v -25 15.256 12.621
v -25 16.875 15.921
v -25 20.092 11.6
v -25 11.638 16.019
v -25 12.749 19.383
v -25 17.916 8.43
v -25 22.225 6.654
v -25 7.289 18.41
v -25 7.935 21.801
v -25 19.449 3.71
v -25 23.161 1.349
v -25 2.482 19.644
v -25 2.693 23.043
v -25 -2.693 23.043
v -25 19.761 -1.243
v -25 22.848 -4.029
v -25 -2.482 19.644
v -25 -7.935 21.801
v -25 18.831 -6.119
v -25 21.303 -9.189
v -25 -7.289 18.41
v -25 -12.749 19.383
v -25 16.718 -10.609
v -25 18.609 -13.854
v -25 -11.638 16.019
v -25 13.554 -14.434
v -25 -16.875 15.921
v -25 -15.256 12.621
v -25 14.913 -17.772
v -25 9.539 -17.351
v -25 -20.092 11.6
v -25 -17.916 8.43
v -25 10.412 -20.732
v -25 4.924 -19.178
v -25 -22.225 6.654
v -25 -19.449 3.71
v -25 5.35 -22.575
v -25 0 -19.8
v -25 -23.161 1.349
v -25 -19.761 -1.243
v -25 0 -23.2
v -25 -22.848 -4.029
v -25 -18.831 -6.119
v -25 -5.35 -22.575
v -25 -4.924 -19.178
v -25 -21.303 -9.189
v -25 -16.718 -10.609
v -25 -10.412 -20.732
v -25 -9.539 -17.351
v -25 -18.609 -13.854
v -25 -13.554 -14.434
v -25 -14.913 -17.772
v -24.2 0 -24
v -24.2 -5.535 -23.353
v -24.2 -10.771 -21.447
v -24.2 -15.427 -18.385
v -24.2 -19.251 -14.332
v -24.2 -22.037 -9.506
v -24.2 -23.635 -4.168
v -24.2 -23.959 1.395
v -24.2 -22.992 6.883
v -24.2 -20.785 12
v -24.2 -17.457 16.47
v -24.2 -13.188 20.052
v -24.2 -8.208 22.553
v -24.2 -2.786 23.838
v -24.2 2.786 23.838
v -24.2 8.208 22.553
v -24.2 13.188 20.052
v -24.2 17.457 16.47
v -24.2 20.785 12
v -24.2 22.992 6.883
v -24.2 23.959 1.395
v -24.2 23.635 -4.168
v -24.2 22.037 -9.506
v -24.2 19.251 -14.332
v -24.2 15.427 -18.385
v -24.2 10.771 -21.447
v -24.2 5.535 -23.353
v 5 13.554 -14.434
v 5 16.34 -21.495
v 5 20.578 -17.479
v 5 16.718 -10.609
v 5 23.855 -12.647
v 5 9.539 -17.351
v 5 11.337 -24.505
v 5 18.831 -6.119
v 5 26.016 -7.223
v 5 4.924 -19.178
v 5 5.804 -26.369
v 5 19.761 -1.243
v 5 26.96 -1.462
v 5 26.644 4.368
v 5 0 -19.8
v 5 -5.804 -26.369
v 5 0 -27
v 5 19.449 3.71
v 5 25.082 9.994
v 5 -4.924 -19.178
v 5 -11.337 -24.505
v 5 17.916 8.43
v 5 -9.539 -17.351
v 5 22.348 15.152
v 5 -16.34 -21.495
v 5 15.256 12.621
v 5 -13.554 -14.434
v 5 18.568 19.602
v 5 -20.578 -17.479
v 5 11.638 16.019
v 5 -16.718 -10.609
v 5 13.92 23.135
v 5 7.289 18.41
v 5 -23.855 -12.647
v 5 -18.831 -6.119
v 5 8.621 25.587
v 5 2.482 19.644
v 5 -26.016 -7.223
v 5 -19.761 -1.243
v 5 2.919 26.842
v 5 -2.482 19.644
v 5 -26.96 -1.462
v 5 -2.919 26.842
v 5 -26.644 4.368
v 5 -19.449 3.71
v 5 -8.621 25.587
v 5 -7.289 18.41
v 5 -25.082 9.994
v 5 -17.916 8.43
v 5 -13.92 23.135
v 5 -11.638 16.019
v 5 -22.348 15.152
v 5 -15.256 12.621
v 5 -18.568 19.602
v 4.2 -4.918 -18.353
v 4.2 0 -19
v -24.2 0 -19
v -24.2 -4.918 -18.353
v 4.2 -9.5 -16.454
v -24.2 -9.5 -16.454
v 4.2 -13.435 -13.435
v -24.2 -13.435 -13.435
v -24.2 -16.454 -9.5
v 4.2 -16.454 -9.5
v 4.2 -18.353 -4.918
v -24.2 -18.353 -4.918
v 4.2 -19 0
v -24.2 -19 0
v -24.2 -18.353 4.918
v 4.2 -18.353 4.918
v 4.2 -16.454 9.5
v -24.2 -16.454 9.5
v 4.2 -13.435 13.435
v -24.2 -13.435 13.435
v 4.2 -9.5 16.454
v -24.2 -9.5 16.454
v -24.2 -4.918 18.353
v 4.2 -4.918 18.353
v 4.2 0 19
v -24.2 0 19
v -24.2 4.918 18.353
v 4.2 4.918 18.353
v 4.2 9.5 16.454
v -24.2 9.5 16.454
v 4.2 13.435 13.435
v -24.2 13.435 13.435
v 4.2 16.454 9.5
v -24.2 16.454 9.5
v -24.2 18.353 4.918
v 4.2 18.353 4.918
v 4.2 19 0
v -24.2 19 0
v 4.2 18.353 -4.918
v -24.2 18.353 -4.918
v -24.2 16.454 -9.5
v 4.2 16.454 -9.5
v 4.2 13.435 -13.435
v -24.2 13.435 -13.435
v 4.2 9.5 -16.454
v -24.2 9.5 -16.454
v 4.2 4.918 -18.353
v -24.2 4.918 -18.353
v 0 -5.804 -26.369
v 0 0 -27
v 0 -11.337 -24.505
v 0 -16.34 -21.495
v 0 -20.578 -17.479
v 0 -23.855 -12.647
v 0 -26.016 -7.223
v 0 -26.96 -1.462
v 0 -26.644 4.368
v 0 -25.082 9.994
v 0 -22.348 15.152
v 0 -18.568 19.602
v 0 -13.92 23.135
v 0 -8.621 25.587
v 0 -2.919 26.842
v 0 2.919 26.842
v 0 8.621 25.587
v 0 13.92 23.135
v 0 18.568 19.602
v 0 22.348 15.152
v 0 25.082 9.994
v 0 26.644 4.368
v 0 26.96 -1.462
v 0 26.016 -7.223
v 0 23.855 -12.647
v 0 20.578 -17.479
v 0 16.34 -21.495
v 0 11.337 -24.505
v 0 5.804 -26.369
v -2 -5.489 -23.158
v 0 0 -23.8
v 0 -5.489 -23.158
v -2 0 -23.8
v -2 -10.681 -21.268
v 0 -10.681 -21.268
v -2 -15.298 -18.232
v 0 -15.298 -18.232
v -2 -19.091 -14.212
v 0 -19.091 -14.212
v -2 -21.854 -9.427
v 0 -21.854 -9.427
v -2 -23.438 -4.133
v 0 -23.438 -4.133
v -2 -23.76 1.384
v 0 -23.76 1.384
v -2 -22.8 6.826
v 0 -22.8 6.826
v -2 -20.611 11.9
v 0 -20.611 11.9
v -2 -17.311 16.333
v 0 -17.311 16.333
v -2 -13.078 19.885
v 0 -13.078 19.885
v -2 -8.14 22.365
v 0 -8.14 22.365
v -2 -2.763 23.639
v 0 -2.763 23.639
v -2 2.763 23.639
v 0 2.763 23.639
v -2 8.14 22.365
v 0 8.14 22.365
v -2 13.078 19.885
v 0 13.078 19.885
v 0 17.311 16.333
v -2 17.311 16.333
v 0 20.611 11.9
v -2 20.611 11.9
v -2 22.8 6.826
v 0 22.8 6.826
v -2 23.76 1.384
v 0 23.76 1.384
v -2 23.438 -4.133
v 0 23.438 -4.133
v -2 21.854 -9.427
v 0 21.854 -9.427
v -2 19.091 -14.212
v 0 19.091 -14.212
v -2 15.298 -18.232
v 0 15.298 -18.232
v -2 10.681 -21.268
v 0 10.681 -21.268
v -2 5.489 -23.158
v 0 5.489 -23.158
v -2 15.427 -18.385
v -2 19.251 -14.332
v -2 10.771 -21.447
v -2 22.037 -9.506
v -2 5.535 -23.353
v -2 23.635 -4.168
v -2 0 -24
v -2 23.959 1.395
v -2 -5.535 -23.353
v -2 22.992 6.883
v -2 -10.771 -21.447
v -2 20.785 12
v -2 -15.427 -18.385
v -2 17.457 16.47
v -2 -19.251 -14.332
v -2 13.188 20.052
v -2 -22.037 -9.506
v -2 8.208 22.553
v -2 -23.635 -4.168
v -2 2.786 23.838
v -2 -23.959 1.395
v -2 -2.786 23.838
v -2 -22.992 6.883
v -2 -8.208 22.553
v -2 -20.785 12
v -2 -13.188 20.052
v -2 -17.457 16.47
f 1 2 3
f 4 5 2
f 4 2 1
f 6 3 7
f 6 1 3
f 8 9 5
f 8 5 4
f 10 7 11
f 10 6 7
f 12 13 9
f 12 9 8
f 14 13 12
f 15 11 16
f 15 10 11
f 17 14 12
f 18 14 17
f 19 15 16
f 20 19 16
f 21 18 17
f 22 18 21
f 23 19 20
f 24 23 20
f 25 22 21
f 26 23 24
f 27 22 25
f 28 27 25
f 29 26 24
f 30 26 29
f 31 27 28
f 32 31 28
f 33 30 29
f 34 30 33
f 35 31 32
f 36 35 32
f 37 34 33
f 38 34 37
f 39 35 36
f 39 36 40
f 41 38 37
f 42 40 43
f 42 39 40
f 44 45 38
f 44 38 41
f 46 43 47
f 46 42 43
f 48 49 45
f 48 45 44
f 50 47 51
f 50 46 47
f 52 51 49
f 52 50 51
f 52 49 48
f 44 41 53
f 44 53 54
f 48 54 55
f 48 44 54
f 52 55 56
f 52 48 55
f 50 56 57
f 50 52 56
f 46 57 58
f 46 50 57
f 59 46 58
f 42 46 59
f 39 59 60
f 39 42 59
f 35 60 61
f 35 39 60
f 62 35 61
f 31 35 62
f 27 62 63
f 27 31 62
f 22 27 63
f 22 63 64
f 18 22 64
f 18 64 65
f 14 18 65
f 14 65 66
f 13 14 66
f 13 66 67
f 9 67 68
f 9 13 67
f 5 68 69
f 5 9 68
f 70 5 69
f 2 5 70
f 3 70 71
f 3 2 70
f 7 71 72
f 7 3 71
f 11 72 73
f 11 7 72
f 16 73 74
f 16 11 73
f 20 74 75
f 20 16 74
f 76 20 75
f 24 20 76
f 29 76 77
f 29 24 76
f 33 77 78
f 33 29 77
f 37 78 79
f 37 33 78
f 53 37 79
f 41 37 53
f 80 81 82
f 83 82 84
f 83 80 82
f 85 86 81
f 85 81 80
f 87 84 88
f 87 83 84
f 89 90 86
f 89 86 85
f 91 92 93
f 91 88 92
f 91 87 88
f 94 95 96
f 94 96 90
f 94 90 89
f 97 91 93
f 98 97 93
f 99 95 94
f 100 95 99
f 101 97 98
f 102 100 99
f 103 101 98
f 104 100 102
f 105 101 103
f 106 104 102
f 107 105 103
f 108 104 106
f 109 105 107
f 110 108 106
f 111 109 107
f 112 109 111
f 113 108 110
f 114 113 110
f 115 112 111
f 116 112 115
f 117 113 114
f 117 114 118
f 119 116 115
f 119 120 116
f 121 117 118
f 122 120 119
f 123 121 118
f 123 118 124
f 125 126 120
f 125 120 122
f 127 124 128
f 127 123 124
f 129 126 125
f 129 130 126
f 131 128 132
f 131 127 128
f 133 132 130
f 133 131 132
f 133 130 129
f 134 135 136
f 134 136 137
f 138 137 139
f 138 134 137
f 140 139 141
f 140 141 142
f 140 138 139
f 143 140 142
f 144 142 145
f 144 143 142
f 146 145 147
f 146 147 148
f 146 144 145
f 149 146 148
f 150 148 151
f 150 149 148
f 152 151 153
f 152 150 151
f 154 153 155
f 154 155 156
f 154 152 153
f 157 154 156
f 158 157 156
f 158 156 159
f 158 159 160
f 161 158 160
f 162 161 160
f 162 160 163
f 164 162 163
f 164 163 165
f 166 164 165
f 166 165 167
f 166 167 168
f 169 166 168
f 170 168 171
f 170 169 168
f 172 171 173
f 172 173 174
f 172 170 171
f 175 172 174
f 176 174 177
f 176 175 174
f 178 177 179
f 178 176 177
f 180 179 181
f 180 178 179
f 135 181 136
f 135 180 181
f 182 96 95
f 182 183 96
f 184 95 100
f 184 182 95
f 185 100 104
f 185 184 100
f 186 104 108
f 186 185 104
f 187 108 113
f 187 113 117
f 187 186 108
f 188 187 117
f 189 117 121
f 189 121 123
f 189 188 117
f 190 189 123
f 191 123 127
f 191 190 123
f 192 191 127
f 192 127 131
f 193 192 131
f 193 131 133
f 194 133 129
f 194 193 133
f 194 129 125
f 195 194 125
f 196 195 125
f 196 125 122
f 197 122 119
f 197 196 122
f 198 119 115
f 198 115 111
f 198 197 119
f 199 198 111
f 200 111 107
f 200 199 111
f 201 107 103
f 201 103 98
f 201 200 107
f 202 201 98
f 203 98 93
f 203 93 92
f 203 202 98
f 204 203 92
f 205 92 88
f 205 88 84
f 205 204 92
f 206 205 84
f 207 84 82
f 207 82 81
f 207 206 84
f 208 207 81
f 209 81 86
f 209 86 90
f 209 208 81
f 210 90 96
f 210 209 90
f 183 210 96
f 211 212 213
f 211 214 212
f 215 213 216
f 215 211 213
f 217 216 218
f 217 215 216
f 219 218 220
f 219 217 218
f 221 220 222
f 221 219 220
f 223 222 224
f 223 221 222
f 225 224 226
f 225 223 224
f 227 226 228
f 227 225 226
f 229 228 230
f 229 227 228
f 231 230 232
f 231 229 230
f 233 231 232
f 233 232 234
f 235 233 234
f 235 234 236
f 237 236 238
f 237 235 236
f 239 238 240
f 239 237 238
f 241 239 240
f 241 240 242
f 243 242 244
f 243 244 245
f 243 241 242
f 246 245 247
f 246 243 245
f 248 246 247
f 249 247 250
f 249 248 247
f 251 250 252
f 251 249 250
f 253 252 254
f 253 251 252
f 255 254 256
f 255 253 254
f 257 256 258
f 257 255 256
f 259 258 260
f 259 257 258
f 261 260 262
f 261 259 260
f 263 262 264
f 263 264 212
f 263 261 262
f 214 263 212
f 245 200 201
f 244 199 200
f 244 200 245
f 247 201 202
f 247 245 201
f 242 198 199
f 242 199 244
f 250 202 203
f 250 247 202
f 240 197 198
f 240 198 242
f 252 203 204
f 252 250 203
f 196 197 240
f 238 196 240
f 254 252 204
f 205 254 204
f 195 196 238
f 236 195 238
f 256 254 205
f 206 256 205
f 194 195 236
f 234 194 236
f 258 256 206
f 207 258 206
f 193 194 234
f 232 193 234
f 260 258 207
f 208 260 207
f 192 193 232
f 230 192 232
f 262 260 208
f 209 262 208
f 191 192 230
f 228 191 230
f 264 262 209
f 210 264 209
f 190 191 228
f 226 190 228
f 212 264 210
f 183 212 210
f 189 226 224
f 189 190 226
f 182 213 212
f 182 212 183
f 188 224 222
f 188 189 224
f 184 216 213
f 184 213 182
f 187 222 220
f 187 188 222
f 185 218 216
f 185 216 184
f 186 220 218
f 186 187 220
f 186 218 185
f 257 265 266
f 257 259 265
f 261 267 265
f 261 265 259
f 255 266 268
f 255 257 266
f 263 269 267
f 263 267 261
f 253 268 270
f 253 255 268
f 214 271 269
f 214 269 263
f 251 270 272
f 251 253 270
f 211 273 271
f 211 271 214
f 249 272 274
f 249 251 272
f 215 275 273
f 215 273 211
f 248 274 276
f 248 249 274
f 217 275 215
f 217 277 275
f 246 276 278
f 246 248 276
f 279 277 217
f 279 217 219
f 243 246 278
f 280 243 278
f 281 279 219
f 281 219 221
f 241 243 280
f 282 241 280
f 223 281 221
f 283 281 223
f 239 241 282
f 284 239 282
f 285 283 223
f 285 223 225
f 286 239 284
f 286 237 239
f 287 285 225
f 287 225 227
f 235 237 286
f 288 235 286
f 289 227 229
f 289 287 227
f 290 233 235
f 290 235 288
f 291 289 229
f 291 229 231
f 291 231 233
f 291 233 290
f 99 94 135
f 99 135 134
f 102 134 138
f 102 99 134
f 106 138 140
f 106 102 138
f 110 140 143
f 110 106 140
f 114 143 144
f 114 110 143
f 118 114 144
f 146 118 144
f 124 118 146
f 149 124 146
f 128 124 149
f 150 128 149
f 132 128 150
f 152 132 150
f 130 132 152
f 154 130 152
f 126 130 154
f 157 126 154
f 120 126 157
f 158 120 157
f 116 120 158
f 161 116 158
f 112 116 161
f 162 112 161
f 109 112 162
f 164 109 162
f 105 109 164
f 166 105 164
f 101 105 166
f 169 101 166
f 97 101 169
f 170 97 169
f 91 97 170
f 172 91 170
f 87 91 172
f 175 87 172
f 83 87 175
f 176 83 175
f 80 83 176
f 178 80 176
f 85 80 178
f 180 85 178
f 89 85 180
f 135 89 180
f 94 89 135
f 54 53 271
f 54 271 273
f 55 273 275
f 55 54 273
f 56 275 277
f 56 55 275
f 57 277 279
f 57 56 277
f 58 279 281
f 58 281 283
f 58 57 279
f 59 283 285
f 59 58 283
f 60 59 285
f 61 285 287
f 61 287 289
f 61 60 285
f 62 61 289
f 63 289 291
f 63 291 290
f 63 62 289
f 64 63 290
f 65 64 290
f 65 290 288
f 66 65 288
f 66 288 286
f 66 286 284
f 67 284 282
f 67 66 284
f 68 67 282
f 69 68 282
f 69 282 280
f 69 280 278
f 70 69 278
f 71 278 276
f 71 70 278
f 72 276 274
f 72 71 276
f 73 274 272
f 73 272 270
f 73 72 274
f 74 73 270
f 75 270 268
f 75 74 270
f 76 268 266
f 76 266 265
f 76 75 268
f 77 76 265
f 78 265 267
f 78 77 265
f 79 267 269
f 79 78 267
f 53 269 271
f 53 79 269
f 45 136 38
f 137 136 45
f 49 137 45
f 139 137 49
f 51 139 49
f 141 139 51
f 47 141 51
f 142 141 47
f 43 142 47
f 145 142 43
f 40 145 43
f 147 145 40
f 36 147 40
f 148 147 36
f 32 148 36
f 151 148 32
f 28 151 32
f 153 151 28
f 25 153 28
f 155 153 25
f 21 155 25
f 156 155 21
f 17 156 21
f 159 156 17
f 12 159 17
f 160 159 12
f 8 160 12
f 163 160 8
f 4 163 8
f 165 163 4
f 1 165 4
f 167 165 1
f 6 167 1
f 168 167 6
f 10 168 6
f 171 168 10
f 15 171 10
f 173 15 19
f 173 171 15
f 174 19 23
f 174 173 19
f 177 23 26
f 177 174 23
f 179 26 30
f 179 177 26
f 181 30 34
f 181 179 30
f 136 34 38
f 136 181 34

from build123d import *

# Parameters (mm, degrees)
FASE1_SIZE = 0.8


with BuildPart() as part:
    # Skizze1 → Rotation1 (revolve)
    with BuildSketch(Plane.XY, mode=Mode.PRIVATE) as rotation1_sk:
        Polygon((-2, 24), (-25, 24), (-25, 19), (5, 19), (5, 27), (0, 27), (0, 25.369078951), (0, 23.8), (-2, 23.8), align=None)
    revolve(rotation1_sk.sketch.rotate(Axis((6.5, 0, 0), (-1, 0, 0)), 90), axis=Axis((6.5, 0, 0), (-1, 0, 0)))

    # Fase1
    fase1_edges = [part.edges().sort_by_distance(p)[0] for p in [
        (-25, 0, 24),
        (-25, 0, 19),
        (5, 0, 19),
    ]]
    chamfer(fase1_edges, length=FASE1_SIZE)


solid = part.part
